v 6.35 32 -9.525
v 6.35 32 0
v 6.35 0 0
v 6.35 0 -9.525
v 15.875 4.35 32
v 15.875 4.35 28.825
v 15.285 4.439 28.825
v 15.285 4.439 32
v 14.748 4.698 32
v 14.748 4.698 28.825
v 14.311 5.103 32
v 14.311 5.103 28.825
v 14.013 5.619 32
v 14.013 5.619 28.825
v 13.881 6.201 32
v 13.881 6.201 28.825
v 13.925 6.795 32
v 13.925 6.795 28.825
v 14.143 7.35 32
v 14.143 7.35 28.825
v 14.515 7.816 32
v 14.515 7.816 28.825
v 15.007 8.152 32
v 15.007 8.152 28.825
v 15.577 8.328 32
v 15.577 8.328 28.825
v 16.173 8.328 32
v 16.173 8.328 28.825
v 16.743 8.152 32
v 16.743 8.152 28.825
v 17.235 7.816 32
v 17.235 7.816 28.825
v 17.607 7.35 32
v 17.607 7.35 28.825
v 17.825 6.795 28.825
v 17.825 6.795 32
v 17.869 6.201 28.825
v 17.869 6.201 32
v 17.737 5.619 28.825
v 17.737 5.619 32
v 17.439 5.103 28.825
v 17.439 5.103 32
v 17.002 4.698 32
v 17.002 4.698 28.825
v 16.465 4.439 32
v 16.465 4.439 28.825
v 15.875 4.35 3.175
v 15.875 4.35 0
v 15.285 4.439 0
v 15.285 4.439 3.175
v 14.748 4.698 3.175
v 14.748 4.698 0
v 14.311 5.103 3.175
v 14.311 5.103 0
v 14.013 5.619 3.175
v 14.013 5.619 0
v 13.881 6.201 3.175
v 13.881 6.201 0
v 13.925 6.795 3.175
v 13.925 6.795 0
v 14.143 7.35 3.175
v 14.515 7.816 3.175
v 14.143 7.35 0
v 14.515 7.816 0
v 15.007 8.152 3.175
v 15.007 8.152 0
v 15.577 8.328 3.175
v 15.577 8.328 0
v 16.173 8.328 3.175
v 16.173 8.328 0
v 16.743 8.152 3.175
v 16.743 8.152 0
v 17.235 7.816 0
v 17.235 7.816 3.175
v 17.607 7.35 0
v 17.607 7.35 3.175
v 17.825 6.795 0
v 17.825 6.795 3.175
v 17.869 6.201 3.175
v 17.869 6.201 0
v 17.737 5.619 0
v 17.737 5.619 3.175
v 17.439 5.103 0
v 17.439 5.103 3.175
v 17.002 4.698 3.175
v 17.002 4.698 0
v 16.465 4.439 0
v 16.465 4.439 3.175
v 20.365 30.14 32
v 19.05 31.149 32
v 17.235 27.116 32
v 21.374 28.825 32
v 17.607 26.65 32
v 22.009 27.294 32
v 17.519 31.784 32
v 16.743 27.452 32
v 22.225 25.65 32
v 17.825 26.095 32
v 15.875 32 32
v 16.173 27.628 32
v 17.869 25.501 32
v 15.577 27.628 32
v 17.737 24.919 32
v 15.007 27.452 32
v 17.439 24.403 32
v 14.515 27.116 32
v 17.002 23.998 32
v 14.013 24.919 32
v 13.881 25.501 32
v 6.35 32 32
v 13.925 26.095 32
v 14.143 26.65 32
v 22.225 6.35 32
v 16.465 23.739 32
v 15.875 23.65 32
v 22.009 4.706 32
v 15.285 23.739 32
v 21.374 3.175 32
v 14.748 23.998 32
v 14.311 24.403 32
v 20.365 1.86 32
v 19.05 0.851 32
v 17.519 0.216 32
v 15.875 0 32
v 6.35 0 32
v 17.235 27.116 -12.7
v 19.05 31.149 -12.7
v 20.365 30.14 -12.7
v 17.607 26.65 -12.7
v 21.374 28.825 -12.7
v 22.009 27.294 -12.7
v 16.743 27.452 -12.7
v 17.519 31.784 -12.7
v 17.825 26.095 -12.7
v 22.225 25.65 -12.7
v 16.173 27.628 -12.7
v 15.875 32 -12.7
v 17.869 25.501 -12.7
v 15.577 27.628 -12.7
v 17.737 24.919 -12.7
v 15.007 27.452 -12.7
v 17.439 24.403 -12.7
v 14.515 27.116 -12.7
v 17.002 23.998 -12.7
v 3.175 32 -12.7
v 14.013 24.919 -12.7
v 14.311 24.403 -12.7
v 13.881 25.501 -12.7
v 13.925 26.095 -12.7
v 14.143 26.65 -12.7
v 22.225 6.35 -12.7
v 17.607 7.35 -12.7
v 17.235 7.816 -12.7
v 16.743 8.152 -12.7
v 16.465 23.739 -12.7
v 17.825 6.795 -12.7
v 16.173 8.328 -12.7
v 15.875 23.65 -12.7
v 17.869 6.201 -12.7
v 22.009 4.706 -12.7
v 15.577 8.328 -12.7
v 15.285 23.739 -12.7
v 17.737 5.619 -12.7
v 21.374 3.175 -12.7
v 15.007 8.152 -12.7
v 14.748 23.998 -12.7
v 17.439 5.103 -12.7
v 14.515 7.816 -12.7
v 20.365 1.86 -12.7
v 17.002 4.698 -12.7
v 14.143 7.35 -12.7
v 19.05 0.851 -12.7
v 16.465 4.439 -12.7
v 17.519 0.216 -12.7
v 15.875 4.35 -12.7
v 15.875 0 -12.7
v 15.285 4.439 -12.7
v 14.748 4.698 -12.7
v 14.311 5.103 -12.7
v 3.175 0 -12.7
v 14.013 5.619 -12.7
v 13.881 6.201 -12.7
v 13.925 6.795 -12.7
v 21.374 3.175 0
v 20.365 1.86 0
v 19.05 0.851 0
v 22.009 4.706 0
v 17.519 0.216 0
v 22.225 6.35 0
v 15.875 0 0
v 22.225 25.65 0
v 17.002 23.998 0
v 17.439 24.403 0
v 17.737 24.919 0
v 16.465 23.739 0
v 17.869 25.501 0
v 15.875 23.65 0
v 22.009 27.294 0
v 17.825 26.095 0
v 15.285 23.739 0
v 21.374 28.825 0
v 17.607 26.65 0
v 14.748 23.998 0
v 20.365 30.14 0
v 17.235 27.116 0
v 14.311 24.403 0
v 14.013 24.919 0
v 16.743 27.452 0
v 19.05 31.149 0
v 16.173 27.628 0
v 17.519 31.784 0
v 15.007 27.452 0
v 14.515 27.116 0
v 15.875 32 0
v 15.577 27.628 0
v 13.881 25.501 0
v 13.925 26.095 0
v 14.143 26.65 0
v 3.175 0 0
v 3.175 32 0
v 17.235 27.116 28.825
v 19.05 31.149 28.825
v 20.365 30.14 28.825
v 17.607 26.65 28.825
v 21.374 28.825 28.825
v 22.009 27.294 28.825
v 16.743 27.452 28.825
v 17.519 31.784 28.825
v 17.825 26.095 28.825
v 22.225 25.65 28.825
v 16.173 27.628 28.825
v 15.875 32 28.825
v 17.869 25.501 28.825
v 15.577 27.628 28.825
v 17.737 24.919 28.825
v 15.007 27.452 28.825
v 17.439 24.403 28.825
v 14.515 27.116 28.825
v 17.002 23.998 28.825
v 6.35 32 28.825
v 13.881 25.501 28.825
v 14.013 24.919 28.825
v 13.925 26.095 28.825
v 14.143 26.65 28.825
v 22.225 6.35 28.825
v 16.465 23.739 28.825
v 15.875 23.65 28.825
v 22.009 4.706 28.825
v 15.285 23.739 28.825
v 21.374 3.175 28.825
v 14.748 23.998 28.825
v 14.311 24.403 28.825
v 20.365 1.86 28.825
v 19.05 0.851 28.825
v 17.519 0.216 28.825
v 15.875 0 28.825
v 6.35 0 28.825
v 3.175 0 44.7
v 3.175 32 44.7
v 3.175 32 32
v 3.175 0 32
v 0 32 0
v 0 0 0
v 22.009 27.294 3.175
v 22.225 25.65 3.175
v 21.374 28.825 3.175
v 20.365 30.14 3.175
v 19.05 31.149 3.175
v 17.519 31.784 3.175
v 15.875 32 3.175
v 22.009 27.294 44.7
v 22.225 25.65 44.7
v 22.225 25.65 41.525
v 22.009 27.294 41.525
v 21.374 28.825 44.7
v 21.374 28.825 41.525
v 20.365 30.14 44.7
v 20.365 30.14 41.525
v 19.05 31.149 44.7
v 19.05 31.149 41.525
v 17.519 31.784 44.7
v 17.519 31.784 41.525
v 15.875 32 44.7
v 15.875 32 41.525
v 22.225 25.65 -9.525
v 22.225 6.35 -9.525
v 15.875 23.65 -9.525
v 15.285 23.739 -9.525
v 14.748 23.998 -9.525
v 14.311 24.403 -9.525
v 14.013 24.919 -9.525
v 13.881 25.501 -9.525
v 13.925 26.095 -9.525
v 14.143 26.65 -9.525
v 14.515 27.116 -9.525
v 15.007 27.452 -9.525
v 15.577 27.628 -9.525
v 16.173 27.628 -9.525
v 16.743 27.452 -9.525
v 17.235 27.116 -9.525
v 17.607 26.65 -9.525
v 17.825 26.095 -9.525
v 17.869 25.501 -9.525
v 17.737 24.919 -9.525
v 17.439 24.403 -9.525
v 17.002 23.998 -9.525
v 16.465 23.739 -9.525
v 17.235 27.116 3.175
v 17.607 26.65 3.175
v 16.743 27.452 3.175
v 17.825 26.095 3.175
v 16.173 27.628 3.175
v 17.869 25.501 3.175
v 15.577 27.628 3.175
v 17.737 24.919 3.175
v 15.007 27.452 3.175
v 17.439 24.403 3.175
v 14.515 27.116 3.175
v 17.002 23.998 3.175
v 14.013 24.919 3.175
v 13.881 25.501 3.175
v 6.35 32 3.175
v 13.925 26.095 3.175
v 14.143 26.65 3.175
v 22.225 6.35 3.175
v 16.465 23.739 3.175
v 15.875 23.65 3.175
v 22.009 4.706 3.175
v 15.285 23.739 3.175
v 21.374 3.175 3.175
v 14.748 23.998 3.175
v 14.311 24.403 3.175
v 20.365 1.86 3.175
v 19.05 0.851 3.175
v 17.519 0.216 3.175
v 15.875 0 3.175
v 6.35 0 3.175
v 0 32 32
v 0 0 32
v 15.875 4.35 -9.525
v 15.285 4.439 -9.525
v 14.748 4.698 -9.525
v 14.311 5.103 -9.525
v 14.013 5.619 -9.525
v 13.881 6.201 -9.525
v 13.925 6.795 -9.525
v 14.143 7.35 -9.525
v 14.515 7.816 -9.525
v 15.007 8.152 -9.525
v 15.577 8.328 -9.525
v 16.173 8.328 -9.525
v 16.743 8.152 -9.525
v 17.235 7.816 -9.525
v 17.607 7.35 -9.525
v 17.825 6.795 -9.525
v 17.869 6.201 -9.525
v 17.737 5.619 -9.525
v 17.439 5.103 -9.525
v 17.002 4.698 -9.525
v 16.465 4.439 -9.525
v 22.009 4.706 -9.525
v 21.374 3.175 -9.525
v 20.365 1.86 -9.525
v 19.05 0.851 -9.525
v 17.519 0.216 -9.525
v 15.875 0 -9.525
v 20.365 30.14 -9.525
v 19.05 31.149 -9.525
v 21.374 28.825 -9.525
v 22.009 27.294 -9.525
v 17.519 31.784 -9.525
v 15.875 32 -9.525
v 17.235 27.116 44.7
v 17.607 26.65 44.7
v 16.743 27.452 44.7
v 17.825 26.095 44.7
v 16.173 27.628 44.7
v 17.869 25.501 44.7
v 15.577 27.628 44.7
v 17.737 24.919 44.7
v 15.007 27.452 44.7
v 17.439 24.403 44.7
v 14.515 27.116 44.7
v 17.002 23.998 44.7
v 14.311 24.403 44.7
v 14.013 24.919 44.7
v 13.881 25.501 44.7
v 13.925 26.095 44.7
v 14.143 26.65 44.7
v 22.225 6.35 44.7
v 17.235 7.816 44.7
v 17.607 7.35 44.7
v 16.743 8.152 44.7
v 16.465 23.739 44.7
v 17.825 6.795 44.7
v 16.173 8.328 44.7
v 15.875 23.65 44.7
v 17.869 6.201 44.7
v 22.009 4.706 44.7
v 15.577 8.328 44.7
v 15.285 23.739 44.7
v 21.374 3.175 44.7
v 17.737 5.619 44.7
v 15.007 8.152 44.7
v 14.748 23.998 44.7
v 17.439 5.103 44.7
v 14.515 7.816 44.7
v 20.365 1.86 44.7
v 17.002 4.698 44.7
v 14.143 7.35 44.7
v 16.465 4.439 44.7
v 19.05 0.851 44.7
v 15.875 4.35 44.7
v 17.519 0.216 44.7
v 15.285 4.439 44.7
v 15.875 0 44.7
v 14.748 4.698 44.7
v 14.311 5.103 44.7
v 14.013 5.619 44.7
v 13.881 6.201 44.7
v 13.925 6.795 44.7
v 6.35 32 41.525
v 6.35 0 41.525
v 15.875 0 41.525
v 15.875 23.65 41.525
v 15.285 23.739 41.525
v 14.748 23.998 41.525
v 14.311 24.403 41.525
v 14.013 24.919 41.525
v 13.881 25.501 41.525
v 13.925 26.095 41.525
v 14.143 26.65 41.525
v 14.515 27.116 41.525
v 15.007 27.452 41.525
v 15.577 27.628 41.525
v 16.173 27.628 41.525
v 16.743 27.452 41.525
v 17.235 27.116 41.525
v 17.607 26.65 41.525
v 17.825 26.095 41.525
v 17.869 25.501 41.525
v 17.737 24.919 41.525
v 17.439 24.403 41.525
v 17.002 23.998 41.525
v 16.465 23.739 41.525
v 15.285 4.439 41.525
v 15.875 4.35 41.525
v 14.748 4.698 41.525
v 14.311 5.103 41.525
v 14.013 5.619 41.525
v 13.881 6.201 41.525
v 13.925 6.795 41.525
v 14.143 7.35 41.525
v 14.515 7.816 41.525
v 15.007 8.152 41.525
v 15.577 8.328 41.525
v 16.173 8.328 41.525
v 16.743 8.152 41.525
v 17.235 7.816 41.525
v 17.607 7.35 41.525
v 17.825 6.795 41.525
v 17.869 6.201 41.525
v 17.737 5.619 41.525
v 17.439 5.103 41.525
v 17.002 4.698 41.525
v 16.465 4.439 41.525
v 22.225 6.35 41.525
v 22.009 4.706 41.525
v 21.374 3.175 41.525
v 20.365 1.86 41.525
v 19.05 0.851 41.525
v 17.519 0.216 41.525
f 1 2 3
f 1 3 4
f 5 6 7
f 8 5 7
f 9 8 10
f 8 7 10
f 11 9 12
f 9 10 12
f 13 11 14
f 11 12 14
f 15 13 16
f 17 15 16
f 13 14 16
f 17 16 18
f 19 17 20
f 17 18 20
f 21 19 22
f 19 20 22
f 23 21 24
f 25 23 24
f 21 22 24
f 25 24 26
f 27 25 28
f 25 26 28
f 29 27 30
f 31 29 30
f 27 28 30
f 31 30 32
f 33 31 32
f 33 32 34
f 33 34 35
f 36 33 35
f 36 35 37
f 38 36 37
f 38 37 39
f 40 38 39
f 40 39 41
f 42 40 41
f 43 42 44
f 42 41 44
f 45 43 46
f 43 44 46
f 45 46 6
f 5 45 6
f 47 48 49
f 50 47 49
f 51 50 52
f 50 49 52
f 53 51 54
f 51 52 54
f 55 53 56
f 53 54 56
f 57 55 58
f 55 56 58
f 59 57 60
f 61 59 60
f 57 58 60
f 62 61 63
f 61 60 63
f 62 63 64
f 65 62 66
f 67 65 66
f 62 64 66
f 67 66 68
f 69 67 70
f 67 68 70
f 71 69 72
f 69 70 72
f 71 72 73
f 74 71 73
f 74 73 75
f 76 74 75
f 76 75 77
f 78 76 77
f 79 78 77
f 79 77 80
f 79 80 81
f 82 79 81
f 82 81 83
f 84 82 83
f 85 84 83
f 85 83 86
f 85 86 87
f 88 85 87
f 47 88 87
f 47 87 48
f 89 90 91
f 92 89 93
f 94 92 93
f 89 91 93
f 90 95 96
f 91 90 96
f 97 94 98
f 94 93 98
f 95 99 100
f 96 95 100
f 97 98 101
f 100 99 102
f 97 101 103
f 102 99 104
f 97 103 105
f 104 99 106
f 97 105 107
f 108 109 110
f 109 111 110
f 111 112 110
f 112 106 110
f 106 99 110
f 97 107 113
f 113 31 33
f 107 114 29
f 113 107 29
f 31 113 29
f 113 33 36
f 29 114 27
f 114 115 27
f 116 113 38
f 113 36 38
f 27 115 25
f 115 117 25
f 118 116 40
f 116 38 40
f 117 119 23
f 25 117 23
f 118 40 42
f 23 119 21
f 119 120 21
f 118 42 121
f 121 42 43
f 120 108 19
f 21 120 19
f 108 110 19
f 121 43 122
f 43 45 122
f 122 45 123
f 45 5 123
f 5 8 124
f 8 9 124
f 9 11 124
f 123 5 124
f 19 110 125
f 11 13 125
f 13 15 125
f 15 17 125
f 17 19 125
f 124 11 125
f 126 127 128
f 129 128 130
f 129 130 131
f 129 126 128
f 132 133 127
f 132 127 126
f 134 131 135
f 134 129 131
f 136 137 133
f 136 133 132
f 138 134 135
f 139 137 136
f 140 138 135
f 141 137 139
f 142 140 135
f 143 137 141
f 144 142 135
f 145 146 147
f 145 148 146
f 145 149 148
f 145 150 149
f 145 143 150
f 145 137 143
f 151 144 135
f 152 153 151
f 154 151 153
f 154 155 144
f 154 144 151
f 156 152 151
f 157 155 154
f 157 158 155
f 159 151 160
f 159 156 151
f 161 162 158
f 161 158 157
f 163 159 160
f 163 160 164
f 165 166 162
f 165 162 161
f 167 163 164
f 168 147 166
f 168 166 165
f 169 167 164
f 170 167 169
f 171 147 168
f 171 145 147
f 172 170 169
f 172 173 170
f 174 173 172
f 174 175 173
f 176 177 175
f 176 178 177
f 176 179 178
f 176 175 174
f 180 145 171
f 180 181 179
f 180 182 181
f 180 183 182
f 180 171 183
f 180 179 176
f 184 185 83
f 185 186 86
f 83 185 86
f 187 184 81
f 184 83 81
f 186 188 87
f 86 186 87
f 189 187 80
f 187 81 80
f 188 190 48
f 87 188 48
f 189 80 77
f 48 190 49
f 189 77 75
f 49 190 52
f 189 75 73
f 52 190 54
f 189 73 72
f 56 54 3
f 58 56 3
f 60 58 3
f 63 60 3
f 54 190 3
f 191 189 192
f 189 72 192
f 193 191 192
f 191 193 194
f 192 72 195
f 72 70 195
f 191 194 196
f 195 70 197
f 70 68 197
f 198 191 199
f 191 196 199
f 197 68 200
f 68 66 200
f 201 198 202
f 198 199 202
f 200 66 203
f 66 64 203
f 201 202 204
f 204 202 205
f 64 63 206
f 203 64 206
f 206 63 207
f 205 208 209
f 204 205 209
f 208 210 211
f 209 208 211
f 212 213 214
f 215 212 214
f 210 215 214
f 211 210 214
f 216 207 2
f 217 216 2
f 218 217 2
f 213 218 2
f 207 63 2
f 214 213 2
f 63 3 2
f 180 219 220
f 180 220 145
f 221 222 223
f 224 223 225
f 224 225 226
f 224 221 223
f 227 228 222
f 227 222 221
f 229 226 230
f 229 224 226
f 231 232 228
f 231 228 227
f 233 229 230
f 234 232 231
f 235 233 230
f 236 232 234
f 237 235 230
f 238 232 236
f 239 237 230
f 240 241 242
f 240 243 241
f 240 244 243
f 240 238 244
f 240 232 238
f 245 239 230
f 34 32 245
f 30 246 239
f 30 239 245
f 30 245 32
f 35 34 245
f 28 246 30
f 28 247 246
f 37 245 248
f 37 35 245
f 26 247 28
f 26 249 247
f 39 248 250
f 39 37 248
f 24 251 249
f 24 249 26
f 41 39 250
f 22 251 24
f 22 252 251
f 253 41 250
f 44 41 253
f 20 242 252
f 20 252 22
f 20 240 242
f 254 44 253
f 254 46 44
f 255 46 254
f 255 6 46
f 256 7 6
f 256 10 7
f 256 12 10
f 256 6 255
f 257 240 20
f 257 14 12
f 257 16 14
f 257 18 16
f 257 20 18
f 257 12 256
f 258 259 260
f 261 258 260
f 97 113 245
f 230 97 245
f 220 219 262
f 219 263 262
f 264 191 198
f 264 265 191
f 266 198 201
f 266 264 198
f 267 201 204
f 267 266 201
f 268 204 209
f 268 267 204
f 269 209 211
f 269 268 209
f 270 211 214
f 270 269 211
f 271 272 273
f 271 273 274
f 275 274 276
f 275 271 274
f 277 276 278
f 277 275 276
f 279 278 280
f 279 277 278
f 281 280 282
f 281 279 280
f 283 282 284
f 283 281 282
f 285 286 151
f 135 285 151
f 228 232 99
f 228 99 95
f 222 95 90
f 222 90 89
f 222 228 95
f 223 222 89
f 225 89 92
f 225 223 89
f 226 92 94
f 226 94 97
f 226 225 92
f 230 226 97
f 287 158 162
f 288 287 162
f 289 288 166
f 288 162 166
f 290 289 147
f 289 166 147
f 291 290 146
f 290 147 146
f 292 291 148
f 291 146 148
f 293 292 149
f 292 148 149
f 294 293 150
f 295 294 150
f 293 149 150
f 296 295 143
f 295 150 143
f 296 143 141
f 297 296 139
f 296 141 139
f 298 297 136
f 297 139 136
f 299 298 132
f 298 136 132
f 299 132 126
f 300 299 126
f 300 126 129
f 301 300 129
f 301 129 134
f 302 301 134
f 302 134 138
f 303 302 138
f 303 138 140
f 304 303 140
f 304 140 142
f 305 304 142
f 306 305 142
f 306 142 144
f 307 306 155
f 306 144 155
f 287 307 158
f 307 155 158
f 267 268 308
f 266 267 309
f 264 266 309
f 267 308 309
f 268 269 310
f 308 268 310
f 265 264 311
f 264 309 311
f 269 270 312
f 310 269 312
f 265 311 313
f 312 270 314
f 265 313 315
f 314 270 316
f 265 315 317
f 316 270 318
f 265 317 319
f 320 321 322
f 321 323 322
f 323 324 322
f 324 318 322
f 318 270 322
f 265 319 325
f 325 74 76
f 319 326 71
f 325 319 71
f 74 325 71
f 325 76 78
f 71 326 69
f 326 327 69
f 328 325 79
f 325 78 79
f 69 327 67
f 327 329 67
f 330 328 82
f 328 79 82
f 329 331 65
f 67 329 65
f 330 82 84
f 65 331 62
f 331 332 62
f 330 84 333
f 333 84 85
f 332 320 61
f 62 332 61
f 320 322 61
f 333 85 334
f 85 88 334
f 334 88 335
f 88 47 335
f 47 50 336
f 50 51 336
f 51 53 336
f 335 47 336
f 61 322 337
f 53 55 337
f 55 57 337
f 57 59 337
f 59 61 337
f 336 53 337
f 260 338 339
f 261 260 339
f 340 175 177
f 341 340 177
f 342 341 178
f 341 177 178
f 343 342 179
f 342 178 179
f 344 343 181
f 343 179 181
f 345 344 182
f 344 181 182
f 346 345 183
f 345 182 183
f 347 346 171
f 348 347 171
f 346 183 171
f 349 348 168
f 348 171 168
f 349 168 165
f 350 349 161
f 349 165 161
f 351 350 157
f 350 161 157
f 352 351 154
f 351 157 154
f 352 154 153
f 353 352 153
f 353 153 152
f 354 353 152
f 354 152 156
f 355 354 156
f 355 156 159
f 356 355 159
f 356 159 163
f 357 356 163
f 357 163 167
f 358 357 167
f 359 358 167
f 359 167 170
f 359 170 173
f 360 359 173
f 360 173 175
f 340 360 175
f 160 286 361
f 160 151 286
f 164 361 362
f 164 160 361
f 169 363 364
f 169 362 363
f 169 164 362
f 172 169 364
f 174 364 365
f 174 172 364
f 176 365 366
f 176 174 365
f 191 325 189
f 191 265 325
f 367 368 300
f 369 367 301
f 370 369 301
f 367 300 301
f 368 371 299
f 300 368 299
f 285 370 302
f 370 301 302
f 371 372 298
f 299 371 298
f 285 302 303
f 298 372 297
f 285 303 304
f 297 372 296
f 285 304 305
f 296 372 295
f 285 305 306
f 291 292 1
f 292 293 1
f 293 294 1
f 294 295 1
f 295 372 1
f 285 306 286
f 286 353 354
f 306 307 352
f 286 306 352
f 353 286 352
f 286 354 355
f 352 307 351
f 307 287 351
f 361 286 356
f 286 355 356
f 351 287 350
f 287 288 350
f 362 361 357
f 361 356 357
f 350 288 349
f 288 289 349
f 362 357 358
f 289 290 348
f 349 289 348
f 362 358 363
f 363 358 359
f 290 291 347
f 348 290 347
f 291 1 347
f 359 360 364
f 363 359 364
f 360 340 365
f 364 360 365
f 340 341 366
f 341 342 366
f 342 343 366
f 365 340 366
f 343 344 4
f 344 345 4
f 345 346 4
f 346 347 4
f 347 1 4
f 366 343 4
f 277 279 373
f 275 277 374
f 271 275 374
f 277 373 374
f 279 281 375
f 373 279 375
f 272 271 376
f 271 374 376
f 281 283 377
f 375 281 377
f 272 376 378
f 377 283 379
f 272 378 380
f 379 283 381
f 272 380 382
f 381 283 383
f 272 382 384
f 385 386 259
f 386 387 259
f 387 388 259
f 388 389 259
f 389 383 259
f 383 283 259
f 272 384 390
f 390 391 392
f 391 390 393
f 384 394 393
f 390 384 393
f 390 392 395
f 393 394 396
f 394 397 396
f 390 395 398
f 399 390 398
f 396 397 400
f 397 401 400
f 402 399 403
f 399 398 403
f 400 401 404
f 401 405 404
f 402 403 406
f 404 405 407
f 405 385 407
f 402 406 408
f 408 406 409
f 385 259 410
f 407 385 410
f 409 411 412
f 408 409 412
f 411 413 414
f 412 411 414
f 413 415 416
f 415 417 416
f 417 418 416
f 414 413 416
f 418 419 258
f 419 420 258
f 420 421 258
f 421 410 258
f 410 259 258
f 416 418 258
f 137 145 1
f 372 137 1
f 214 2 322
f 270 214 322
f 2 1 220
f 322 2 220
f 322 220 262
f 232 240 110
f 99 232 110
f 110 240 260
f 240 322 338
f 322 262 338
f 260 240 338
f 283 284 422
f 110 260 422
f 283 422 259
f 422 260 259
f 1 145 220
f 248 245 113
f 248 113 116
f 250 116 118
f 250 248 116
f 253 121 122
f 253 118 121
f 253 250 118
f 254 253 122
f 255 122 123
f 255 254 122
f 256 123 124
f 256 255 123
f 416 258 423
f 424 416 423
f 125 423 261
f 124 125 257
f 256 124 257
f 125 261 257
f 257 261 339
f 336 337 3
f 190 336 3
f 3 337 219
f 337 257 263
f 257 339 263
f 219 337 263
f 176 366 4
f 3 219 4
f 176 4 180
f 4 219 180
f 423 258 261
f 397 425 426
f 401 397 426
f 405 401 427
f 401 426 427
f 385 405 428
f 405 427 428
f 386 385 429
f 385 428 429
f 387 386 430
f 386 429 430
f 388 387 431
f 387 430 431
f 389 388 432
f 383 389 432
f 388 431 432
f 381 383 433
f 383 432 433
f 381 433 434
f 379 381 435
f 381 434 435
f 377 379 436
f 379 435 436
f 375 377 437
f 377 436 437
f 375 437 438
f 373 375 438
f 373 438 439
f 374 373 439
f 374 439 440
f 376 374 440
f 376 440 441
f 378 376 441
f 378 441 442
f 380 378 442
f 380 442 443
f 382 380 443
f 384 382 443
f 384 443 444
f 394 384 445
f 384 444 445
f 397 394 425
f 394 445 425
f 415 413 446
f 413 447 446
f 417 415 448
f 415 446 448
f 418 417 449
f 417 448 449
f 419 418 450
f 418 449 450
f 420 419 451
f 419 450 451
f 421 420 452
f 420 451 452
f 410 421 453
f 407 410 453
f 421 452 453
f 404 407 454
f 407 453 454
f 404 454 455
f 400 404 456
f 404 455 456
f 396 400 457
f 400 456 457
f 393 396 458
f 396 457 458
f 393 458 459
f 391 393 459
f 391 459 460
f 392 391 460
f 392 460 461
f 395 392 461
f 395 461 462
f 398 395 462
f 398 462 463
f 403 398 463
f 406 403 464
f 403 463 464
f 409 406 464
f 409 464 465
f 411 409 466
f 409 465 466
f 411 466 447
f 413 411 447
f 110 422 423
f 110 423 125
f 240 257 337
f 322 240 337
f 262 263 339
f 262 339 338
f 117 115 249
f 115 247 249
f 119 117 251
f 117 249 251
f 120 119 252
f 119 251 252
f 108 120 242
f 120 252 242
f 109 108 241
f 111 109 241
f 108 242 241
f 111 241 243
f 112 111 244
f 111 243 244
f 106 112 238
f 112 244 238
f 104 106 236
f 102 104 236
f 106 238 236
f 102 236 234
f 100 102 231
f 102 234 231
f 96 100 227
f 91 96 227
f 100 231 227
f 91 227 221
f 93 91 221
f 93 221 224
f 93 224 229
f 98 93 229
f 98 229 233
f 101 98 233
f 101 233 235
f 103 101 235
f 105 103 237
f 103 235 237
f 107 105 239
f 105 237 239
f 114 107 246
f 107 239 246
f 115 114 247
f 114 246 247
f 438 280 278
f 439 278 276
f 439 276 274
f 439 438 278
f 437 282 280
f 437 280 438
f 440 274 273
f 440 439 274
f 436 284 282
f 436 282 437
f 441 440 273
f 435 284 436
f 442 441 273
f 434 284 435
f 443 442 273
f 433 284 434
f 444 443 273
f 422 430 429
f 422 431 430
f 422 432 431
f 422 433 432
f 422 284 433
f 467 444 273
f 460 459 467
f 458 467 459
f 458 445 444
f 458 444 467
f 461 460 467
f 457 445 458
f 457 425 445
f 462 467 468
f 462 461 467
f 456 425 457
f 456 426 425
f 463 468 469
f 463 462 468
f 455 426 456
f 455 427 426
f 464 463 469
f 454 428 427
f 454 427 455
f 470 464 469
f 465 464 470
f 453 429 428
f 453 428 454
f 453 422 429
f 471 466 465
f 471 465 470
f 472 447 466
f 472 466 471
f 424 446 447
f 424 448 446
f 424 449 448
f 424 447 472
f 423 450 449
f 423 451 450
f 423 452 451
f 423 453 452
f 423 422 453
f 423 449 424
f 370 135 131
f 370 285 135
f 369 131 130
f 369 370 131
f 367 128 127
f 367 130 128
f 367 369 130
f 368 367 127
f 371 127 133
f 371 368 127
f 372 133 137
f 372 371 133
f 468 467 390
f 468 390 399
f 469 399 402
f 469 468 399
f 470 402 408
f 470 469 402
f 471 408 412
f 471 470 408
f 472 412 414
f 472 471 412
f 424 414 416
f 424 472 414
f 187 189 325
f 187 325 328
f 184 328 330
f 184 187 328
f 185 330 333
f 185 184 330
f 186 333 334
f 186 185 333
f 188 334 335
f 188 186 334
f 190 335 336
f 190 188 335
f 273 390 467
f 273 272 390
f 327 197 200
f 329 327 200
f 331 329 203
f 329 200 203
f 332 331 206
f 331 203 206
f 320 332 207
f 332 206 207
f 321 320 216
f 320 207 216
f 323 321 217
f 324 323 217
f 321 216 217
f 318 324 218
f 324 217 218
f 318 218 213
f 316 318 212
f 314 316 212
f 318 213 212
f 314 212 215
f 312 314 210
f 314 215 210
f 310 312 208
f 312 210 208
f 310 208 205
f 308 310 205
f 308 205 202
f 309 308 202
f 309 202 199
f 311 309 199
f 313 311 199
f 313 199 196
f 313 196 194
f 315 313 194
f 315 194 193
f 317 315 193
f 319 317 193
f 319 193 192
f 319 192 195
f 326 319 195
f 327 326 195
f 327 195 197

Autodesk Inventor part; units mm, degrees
ref_plane "YZ Plane" through (0, 0, 0) normal (1, 0, 0) x (0, 1, 0)
ref_plane "XZ Plane" through (0, 0, 0) normal (0, 1, 0) x (-1, 0, 0)
ref_plane "XY Plane" through (0, 0, 0) normal (0, 0, 1) x (1, 0, 0)
sketch "Sketch1" plane through (0, 0, 0) normal (1, 0, 0) x (0, 1, 0)
  line L0 (0, 0) -> (32, 0)
  line L1 (32, 0) -> (32, 32)
  line L2 (32, 32) -> (0, 32)
  line L3 (0, 32) -> (0, 0)
  dimension "d0" = 32
  dimension "d1" = 32
extrude "Extrusion1" add sketch "Sketch1" along normal blind 3.175
sketch "Sketch2" plane through (3.175, 0, 0) normal (1, 0, 0) x (0, 0, -1)
  line L0 (0, 32) -> (-32, 32) projected
  line L1 (-32, 0) -> (0, 0) projected
  line L2 (-32, 32) -> (-44.7, 32)
  line L3 (-44.7, 32) -> (-44.7, 0)
  line L4 (-44.7, 0) -> (-32, 0)
  line L5 (0, 32) -> (12.7, 32)
  line L6 (12.7, 32) -> (12.7, 0)
  line L7 (12.7, 0) -> (0, 0)
  dimension "d4" = 12.7
  dimension "d5" = 90
  dimension "d6" = 12.7
extrude "Extrusion2" add sketch "Sketch2" along normal blind 3.175
sketch "Sketch3" plane through (6.35, 0, 0) normal (1, 0, 0) x (0, 0, -1)
  line L0 (-32, 32) -> (-32, 0) projected
  line L1 (0, 0) -> (0, 32) projected
  line L2 (12.7, 0) -> (12.7, 32) projected
  line L3 (-44.7, 32) -> (-44.7, 0) projected
  line L4 (-32, 32) -> (-44.7, 32) projected
  line L5 (-44.7, 0) -> (-32, 0) projected
  line L6 (-44.7, 32) -> (-41.525, 32)
  line L7 (-41.525, 32) -> (-41.525, 0)
  line L8 (-41.525, 0) -> (-44.7, 0)
  line L9 (-44.7, 0) -> (-44.7, 32)
  line L10 (-32, 0) -> (0, 0) projected
  line L11 (-32, 32) -> (-28.825, 32)
  line L12 (-28.825, 32) -> (-28.825, 0)
  line L13 (-28.825, 0) -> (-32, 0)
  line L14 (-32, 0) -> (-32, 32)
  line L15 (0, 32) -> (-32, 32) projected
  line L16 (0, 32) -> (-3.175, 32)
  line L17 (-3.175, 32) -> (-3.175, 0)
  line L18 (-3.175, 0) -> (0, 0)
  line L19 (0, 0) -> (0, 32)
  line L20 (0, 0) -> (12.7, 0) projected
  line L21 (12.7, 32) -> (9.525, 32)
  line L22 (9.525, 32) -> (9.525, 0)
  line L23 (9.525, 0) -> (12.7, 0)
  line L24 (12.7, 0) -> (12.7, 32)
  dimension "d9" = 3.175
  dimension "d10" = 3.175
  dimension "d11" = 3.175
  dimension "d12" = 3.175
extrude "Extrusion3" add sketch "Sketch3" along normal blind 15.875 contours L11 L12 L10 L0 | L22 L21 L2 L20 | L7 L5 L3 L4 | L15 L1 L10 L17
fillet "Fillet1" radius 6.35 8 edges at (22.225, 32, 43.1125) (22.225, 32, 30.4125) (22.225, 0, 43.1125) (22.225, 0, 30.4125) (22.225, 0, 1.5875) (22.225, 32, 1.5875) (22.225, 32, -11.1125) (22.225, 0, -11.1125)
sketch "Sketch4" plane through (3.175, 0, 44.7) normal (0, 0, 1) x (1, 0, 0)
  arc A0 (19.05, 25.65) -> (12.7, 32) centre (12.7, 25.65) ccw projected
  arc A1 (12.7, 0) -> (19.05, 6.35) centre (12.7, 6.35) ccw projected
  point P0 (-3.175, 0)
hole "Hole1" at (15.875, 25.65, 44.7) at (15.875, 6.35, 44.7) direction (0, 0, -1) diameter 4 end through all
properties part number "pully mount"
